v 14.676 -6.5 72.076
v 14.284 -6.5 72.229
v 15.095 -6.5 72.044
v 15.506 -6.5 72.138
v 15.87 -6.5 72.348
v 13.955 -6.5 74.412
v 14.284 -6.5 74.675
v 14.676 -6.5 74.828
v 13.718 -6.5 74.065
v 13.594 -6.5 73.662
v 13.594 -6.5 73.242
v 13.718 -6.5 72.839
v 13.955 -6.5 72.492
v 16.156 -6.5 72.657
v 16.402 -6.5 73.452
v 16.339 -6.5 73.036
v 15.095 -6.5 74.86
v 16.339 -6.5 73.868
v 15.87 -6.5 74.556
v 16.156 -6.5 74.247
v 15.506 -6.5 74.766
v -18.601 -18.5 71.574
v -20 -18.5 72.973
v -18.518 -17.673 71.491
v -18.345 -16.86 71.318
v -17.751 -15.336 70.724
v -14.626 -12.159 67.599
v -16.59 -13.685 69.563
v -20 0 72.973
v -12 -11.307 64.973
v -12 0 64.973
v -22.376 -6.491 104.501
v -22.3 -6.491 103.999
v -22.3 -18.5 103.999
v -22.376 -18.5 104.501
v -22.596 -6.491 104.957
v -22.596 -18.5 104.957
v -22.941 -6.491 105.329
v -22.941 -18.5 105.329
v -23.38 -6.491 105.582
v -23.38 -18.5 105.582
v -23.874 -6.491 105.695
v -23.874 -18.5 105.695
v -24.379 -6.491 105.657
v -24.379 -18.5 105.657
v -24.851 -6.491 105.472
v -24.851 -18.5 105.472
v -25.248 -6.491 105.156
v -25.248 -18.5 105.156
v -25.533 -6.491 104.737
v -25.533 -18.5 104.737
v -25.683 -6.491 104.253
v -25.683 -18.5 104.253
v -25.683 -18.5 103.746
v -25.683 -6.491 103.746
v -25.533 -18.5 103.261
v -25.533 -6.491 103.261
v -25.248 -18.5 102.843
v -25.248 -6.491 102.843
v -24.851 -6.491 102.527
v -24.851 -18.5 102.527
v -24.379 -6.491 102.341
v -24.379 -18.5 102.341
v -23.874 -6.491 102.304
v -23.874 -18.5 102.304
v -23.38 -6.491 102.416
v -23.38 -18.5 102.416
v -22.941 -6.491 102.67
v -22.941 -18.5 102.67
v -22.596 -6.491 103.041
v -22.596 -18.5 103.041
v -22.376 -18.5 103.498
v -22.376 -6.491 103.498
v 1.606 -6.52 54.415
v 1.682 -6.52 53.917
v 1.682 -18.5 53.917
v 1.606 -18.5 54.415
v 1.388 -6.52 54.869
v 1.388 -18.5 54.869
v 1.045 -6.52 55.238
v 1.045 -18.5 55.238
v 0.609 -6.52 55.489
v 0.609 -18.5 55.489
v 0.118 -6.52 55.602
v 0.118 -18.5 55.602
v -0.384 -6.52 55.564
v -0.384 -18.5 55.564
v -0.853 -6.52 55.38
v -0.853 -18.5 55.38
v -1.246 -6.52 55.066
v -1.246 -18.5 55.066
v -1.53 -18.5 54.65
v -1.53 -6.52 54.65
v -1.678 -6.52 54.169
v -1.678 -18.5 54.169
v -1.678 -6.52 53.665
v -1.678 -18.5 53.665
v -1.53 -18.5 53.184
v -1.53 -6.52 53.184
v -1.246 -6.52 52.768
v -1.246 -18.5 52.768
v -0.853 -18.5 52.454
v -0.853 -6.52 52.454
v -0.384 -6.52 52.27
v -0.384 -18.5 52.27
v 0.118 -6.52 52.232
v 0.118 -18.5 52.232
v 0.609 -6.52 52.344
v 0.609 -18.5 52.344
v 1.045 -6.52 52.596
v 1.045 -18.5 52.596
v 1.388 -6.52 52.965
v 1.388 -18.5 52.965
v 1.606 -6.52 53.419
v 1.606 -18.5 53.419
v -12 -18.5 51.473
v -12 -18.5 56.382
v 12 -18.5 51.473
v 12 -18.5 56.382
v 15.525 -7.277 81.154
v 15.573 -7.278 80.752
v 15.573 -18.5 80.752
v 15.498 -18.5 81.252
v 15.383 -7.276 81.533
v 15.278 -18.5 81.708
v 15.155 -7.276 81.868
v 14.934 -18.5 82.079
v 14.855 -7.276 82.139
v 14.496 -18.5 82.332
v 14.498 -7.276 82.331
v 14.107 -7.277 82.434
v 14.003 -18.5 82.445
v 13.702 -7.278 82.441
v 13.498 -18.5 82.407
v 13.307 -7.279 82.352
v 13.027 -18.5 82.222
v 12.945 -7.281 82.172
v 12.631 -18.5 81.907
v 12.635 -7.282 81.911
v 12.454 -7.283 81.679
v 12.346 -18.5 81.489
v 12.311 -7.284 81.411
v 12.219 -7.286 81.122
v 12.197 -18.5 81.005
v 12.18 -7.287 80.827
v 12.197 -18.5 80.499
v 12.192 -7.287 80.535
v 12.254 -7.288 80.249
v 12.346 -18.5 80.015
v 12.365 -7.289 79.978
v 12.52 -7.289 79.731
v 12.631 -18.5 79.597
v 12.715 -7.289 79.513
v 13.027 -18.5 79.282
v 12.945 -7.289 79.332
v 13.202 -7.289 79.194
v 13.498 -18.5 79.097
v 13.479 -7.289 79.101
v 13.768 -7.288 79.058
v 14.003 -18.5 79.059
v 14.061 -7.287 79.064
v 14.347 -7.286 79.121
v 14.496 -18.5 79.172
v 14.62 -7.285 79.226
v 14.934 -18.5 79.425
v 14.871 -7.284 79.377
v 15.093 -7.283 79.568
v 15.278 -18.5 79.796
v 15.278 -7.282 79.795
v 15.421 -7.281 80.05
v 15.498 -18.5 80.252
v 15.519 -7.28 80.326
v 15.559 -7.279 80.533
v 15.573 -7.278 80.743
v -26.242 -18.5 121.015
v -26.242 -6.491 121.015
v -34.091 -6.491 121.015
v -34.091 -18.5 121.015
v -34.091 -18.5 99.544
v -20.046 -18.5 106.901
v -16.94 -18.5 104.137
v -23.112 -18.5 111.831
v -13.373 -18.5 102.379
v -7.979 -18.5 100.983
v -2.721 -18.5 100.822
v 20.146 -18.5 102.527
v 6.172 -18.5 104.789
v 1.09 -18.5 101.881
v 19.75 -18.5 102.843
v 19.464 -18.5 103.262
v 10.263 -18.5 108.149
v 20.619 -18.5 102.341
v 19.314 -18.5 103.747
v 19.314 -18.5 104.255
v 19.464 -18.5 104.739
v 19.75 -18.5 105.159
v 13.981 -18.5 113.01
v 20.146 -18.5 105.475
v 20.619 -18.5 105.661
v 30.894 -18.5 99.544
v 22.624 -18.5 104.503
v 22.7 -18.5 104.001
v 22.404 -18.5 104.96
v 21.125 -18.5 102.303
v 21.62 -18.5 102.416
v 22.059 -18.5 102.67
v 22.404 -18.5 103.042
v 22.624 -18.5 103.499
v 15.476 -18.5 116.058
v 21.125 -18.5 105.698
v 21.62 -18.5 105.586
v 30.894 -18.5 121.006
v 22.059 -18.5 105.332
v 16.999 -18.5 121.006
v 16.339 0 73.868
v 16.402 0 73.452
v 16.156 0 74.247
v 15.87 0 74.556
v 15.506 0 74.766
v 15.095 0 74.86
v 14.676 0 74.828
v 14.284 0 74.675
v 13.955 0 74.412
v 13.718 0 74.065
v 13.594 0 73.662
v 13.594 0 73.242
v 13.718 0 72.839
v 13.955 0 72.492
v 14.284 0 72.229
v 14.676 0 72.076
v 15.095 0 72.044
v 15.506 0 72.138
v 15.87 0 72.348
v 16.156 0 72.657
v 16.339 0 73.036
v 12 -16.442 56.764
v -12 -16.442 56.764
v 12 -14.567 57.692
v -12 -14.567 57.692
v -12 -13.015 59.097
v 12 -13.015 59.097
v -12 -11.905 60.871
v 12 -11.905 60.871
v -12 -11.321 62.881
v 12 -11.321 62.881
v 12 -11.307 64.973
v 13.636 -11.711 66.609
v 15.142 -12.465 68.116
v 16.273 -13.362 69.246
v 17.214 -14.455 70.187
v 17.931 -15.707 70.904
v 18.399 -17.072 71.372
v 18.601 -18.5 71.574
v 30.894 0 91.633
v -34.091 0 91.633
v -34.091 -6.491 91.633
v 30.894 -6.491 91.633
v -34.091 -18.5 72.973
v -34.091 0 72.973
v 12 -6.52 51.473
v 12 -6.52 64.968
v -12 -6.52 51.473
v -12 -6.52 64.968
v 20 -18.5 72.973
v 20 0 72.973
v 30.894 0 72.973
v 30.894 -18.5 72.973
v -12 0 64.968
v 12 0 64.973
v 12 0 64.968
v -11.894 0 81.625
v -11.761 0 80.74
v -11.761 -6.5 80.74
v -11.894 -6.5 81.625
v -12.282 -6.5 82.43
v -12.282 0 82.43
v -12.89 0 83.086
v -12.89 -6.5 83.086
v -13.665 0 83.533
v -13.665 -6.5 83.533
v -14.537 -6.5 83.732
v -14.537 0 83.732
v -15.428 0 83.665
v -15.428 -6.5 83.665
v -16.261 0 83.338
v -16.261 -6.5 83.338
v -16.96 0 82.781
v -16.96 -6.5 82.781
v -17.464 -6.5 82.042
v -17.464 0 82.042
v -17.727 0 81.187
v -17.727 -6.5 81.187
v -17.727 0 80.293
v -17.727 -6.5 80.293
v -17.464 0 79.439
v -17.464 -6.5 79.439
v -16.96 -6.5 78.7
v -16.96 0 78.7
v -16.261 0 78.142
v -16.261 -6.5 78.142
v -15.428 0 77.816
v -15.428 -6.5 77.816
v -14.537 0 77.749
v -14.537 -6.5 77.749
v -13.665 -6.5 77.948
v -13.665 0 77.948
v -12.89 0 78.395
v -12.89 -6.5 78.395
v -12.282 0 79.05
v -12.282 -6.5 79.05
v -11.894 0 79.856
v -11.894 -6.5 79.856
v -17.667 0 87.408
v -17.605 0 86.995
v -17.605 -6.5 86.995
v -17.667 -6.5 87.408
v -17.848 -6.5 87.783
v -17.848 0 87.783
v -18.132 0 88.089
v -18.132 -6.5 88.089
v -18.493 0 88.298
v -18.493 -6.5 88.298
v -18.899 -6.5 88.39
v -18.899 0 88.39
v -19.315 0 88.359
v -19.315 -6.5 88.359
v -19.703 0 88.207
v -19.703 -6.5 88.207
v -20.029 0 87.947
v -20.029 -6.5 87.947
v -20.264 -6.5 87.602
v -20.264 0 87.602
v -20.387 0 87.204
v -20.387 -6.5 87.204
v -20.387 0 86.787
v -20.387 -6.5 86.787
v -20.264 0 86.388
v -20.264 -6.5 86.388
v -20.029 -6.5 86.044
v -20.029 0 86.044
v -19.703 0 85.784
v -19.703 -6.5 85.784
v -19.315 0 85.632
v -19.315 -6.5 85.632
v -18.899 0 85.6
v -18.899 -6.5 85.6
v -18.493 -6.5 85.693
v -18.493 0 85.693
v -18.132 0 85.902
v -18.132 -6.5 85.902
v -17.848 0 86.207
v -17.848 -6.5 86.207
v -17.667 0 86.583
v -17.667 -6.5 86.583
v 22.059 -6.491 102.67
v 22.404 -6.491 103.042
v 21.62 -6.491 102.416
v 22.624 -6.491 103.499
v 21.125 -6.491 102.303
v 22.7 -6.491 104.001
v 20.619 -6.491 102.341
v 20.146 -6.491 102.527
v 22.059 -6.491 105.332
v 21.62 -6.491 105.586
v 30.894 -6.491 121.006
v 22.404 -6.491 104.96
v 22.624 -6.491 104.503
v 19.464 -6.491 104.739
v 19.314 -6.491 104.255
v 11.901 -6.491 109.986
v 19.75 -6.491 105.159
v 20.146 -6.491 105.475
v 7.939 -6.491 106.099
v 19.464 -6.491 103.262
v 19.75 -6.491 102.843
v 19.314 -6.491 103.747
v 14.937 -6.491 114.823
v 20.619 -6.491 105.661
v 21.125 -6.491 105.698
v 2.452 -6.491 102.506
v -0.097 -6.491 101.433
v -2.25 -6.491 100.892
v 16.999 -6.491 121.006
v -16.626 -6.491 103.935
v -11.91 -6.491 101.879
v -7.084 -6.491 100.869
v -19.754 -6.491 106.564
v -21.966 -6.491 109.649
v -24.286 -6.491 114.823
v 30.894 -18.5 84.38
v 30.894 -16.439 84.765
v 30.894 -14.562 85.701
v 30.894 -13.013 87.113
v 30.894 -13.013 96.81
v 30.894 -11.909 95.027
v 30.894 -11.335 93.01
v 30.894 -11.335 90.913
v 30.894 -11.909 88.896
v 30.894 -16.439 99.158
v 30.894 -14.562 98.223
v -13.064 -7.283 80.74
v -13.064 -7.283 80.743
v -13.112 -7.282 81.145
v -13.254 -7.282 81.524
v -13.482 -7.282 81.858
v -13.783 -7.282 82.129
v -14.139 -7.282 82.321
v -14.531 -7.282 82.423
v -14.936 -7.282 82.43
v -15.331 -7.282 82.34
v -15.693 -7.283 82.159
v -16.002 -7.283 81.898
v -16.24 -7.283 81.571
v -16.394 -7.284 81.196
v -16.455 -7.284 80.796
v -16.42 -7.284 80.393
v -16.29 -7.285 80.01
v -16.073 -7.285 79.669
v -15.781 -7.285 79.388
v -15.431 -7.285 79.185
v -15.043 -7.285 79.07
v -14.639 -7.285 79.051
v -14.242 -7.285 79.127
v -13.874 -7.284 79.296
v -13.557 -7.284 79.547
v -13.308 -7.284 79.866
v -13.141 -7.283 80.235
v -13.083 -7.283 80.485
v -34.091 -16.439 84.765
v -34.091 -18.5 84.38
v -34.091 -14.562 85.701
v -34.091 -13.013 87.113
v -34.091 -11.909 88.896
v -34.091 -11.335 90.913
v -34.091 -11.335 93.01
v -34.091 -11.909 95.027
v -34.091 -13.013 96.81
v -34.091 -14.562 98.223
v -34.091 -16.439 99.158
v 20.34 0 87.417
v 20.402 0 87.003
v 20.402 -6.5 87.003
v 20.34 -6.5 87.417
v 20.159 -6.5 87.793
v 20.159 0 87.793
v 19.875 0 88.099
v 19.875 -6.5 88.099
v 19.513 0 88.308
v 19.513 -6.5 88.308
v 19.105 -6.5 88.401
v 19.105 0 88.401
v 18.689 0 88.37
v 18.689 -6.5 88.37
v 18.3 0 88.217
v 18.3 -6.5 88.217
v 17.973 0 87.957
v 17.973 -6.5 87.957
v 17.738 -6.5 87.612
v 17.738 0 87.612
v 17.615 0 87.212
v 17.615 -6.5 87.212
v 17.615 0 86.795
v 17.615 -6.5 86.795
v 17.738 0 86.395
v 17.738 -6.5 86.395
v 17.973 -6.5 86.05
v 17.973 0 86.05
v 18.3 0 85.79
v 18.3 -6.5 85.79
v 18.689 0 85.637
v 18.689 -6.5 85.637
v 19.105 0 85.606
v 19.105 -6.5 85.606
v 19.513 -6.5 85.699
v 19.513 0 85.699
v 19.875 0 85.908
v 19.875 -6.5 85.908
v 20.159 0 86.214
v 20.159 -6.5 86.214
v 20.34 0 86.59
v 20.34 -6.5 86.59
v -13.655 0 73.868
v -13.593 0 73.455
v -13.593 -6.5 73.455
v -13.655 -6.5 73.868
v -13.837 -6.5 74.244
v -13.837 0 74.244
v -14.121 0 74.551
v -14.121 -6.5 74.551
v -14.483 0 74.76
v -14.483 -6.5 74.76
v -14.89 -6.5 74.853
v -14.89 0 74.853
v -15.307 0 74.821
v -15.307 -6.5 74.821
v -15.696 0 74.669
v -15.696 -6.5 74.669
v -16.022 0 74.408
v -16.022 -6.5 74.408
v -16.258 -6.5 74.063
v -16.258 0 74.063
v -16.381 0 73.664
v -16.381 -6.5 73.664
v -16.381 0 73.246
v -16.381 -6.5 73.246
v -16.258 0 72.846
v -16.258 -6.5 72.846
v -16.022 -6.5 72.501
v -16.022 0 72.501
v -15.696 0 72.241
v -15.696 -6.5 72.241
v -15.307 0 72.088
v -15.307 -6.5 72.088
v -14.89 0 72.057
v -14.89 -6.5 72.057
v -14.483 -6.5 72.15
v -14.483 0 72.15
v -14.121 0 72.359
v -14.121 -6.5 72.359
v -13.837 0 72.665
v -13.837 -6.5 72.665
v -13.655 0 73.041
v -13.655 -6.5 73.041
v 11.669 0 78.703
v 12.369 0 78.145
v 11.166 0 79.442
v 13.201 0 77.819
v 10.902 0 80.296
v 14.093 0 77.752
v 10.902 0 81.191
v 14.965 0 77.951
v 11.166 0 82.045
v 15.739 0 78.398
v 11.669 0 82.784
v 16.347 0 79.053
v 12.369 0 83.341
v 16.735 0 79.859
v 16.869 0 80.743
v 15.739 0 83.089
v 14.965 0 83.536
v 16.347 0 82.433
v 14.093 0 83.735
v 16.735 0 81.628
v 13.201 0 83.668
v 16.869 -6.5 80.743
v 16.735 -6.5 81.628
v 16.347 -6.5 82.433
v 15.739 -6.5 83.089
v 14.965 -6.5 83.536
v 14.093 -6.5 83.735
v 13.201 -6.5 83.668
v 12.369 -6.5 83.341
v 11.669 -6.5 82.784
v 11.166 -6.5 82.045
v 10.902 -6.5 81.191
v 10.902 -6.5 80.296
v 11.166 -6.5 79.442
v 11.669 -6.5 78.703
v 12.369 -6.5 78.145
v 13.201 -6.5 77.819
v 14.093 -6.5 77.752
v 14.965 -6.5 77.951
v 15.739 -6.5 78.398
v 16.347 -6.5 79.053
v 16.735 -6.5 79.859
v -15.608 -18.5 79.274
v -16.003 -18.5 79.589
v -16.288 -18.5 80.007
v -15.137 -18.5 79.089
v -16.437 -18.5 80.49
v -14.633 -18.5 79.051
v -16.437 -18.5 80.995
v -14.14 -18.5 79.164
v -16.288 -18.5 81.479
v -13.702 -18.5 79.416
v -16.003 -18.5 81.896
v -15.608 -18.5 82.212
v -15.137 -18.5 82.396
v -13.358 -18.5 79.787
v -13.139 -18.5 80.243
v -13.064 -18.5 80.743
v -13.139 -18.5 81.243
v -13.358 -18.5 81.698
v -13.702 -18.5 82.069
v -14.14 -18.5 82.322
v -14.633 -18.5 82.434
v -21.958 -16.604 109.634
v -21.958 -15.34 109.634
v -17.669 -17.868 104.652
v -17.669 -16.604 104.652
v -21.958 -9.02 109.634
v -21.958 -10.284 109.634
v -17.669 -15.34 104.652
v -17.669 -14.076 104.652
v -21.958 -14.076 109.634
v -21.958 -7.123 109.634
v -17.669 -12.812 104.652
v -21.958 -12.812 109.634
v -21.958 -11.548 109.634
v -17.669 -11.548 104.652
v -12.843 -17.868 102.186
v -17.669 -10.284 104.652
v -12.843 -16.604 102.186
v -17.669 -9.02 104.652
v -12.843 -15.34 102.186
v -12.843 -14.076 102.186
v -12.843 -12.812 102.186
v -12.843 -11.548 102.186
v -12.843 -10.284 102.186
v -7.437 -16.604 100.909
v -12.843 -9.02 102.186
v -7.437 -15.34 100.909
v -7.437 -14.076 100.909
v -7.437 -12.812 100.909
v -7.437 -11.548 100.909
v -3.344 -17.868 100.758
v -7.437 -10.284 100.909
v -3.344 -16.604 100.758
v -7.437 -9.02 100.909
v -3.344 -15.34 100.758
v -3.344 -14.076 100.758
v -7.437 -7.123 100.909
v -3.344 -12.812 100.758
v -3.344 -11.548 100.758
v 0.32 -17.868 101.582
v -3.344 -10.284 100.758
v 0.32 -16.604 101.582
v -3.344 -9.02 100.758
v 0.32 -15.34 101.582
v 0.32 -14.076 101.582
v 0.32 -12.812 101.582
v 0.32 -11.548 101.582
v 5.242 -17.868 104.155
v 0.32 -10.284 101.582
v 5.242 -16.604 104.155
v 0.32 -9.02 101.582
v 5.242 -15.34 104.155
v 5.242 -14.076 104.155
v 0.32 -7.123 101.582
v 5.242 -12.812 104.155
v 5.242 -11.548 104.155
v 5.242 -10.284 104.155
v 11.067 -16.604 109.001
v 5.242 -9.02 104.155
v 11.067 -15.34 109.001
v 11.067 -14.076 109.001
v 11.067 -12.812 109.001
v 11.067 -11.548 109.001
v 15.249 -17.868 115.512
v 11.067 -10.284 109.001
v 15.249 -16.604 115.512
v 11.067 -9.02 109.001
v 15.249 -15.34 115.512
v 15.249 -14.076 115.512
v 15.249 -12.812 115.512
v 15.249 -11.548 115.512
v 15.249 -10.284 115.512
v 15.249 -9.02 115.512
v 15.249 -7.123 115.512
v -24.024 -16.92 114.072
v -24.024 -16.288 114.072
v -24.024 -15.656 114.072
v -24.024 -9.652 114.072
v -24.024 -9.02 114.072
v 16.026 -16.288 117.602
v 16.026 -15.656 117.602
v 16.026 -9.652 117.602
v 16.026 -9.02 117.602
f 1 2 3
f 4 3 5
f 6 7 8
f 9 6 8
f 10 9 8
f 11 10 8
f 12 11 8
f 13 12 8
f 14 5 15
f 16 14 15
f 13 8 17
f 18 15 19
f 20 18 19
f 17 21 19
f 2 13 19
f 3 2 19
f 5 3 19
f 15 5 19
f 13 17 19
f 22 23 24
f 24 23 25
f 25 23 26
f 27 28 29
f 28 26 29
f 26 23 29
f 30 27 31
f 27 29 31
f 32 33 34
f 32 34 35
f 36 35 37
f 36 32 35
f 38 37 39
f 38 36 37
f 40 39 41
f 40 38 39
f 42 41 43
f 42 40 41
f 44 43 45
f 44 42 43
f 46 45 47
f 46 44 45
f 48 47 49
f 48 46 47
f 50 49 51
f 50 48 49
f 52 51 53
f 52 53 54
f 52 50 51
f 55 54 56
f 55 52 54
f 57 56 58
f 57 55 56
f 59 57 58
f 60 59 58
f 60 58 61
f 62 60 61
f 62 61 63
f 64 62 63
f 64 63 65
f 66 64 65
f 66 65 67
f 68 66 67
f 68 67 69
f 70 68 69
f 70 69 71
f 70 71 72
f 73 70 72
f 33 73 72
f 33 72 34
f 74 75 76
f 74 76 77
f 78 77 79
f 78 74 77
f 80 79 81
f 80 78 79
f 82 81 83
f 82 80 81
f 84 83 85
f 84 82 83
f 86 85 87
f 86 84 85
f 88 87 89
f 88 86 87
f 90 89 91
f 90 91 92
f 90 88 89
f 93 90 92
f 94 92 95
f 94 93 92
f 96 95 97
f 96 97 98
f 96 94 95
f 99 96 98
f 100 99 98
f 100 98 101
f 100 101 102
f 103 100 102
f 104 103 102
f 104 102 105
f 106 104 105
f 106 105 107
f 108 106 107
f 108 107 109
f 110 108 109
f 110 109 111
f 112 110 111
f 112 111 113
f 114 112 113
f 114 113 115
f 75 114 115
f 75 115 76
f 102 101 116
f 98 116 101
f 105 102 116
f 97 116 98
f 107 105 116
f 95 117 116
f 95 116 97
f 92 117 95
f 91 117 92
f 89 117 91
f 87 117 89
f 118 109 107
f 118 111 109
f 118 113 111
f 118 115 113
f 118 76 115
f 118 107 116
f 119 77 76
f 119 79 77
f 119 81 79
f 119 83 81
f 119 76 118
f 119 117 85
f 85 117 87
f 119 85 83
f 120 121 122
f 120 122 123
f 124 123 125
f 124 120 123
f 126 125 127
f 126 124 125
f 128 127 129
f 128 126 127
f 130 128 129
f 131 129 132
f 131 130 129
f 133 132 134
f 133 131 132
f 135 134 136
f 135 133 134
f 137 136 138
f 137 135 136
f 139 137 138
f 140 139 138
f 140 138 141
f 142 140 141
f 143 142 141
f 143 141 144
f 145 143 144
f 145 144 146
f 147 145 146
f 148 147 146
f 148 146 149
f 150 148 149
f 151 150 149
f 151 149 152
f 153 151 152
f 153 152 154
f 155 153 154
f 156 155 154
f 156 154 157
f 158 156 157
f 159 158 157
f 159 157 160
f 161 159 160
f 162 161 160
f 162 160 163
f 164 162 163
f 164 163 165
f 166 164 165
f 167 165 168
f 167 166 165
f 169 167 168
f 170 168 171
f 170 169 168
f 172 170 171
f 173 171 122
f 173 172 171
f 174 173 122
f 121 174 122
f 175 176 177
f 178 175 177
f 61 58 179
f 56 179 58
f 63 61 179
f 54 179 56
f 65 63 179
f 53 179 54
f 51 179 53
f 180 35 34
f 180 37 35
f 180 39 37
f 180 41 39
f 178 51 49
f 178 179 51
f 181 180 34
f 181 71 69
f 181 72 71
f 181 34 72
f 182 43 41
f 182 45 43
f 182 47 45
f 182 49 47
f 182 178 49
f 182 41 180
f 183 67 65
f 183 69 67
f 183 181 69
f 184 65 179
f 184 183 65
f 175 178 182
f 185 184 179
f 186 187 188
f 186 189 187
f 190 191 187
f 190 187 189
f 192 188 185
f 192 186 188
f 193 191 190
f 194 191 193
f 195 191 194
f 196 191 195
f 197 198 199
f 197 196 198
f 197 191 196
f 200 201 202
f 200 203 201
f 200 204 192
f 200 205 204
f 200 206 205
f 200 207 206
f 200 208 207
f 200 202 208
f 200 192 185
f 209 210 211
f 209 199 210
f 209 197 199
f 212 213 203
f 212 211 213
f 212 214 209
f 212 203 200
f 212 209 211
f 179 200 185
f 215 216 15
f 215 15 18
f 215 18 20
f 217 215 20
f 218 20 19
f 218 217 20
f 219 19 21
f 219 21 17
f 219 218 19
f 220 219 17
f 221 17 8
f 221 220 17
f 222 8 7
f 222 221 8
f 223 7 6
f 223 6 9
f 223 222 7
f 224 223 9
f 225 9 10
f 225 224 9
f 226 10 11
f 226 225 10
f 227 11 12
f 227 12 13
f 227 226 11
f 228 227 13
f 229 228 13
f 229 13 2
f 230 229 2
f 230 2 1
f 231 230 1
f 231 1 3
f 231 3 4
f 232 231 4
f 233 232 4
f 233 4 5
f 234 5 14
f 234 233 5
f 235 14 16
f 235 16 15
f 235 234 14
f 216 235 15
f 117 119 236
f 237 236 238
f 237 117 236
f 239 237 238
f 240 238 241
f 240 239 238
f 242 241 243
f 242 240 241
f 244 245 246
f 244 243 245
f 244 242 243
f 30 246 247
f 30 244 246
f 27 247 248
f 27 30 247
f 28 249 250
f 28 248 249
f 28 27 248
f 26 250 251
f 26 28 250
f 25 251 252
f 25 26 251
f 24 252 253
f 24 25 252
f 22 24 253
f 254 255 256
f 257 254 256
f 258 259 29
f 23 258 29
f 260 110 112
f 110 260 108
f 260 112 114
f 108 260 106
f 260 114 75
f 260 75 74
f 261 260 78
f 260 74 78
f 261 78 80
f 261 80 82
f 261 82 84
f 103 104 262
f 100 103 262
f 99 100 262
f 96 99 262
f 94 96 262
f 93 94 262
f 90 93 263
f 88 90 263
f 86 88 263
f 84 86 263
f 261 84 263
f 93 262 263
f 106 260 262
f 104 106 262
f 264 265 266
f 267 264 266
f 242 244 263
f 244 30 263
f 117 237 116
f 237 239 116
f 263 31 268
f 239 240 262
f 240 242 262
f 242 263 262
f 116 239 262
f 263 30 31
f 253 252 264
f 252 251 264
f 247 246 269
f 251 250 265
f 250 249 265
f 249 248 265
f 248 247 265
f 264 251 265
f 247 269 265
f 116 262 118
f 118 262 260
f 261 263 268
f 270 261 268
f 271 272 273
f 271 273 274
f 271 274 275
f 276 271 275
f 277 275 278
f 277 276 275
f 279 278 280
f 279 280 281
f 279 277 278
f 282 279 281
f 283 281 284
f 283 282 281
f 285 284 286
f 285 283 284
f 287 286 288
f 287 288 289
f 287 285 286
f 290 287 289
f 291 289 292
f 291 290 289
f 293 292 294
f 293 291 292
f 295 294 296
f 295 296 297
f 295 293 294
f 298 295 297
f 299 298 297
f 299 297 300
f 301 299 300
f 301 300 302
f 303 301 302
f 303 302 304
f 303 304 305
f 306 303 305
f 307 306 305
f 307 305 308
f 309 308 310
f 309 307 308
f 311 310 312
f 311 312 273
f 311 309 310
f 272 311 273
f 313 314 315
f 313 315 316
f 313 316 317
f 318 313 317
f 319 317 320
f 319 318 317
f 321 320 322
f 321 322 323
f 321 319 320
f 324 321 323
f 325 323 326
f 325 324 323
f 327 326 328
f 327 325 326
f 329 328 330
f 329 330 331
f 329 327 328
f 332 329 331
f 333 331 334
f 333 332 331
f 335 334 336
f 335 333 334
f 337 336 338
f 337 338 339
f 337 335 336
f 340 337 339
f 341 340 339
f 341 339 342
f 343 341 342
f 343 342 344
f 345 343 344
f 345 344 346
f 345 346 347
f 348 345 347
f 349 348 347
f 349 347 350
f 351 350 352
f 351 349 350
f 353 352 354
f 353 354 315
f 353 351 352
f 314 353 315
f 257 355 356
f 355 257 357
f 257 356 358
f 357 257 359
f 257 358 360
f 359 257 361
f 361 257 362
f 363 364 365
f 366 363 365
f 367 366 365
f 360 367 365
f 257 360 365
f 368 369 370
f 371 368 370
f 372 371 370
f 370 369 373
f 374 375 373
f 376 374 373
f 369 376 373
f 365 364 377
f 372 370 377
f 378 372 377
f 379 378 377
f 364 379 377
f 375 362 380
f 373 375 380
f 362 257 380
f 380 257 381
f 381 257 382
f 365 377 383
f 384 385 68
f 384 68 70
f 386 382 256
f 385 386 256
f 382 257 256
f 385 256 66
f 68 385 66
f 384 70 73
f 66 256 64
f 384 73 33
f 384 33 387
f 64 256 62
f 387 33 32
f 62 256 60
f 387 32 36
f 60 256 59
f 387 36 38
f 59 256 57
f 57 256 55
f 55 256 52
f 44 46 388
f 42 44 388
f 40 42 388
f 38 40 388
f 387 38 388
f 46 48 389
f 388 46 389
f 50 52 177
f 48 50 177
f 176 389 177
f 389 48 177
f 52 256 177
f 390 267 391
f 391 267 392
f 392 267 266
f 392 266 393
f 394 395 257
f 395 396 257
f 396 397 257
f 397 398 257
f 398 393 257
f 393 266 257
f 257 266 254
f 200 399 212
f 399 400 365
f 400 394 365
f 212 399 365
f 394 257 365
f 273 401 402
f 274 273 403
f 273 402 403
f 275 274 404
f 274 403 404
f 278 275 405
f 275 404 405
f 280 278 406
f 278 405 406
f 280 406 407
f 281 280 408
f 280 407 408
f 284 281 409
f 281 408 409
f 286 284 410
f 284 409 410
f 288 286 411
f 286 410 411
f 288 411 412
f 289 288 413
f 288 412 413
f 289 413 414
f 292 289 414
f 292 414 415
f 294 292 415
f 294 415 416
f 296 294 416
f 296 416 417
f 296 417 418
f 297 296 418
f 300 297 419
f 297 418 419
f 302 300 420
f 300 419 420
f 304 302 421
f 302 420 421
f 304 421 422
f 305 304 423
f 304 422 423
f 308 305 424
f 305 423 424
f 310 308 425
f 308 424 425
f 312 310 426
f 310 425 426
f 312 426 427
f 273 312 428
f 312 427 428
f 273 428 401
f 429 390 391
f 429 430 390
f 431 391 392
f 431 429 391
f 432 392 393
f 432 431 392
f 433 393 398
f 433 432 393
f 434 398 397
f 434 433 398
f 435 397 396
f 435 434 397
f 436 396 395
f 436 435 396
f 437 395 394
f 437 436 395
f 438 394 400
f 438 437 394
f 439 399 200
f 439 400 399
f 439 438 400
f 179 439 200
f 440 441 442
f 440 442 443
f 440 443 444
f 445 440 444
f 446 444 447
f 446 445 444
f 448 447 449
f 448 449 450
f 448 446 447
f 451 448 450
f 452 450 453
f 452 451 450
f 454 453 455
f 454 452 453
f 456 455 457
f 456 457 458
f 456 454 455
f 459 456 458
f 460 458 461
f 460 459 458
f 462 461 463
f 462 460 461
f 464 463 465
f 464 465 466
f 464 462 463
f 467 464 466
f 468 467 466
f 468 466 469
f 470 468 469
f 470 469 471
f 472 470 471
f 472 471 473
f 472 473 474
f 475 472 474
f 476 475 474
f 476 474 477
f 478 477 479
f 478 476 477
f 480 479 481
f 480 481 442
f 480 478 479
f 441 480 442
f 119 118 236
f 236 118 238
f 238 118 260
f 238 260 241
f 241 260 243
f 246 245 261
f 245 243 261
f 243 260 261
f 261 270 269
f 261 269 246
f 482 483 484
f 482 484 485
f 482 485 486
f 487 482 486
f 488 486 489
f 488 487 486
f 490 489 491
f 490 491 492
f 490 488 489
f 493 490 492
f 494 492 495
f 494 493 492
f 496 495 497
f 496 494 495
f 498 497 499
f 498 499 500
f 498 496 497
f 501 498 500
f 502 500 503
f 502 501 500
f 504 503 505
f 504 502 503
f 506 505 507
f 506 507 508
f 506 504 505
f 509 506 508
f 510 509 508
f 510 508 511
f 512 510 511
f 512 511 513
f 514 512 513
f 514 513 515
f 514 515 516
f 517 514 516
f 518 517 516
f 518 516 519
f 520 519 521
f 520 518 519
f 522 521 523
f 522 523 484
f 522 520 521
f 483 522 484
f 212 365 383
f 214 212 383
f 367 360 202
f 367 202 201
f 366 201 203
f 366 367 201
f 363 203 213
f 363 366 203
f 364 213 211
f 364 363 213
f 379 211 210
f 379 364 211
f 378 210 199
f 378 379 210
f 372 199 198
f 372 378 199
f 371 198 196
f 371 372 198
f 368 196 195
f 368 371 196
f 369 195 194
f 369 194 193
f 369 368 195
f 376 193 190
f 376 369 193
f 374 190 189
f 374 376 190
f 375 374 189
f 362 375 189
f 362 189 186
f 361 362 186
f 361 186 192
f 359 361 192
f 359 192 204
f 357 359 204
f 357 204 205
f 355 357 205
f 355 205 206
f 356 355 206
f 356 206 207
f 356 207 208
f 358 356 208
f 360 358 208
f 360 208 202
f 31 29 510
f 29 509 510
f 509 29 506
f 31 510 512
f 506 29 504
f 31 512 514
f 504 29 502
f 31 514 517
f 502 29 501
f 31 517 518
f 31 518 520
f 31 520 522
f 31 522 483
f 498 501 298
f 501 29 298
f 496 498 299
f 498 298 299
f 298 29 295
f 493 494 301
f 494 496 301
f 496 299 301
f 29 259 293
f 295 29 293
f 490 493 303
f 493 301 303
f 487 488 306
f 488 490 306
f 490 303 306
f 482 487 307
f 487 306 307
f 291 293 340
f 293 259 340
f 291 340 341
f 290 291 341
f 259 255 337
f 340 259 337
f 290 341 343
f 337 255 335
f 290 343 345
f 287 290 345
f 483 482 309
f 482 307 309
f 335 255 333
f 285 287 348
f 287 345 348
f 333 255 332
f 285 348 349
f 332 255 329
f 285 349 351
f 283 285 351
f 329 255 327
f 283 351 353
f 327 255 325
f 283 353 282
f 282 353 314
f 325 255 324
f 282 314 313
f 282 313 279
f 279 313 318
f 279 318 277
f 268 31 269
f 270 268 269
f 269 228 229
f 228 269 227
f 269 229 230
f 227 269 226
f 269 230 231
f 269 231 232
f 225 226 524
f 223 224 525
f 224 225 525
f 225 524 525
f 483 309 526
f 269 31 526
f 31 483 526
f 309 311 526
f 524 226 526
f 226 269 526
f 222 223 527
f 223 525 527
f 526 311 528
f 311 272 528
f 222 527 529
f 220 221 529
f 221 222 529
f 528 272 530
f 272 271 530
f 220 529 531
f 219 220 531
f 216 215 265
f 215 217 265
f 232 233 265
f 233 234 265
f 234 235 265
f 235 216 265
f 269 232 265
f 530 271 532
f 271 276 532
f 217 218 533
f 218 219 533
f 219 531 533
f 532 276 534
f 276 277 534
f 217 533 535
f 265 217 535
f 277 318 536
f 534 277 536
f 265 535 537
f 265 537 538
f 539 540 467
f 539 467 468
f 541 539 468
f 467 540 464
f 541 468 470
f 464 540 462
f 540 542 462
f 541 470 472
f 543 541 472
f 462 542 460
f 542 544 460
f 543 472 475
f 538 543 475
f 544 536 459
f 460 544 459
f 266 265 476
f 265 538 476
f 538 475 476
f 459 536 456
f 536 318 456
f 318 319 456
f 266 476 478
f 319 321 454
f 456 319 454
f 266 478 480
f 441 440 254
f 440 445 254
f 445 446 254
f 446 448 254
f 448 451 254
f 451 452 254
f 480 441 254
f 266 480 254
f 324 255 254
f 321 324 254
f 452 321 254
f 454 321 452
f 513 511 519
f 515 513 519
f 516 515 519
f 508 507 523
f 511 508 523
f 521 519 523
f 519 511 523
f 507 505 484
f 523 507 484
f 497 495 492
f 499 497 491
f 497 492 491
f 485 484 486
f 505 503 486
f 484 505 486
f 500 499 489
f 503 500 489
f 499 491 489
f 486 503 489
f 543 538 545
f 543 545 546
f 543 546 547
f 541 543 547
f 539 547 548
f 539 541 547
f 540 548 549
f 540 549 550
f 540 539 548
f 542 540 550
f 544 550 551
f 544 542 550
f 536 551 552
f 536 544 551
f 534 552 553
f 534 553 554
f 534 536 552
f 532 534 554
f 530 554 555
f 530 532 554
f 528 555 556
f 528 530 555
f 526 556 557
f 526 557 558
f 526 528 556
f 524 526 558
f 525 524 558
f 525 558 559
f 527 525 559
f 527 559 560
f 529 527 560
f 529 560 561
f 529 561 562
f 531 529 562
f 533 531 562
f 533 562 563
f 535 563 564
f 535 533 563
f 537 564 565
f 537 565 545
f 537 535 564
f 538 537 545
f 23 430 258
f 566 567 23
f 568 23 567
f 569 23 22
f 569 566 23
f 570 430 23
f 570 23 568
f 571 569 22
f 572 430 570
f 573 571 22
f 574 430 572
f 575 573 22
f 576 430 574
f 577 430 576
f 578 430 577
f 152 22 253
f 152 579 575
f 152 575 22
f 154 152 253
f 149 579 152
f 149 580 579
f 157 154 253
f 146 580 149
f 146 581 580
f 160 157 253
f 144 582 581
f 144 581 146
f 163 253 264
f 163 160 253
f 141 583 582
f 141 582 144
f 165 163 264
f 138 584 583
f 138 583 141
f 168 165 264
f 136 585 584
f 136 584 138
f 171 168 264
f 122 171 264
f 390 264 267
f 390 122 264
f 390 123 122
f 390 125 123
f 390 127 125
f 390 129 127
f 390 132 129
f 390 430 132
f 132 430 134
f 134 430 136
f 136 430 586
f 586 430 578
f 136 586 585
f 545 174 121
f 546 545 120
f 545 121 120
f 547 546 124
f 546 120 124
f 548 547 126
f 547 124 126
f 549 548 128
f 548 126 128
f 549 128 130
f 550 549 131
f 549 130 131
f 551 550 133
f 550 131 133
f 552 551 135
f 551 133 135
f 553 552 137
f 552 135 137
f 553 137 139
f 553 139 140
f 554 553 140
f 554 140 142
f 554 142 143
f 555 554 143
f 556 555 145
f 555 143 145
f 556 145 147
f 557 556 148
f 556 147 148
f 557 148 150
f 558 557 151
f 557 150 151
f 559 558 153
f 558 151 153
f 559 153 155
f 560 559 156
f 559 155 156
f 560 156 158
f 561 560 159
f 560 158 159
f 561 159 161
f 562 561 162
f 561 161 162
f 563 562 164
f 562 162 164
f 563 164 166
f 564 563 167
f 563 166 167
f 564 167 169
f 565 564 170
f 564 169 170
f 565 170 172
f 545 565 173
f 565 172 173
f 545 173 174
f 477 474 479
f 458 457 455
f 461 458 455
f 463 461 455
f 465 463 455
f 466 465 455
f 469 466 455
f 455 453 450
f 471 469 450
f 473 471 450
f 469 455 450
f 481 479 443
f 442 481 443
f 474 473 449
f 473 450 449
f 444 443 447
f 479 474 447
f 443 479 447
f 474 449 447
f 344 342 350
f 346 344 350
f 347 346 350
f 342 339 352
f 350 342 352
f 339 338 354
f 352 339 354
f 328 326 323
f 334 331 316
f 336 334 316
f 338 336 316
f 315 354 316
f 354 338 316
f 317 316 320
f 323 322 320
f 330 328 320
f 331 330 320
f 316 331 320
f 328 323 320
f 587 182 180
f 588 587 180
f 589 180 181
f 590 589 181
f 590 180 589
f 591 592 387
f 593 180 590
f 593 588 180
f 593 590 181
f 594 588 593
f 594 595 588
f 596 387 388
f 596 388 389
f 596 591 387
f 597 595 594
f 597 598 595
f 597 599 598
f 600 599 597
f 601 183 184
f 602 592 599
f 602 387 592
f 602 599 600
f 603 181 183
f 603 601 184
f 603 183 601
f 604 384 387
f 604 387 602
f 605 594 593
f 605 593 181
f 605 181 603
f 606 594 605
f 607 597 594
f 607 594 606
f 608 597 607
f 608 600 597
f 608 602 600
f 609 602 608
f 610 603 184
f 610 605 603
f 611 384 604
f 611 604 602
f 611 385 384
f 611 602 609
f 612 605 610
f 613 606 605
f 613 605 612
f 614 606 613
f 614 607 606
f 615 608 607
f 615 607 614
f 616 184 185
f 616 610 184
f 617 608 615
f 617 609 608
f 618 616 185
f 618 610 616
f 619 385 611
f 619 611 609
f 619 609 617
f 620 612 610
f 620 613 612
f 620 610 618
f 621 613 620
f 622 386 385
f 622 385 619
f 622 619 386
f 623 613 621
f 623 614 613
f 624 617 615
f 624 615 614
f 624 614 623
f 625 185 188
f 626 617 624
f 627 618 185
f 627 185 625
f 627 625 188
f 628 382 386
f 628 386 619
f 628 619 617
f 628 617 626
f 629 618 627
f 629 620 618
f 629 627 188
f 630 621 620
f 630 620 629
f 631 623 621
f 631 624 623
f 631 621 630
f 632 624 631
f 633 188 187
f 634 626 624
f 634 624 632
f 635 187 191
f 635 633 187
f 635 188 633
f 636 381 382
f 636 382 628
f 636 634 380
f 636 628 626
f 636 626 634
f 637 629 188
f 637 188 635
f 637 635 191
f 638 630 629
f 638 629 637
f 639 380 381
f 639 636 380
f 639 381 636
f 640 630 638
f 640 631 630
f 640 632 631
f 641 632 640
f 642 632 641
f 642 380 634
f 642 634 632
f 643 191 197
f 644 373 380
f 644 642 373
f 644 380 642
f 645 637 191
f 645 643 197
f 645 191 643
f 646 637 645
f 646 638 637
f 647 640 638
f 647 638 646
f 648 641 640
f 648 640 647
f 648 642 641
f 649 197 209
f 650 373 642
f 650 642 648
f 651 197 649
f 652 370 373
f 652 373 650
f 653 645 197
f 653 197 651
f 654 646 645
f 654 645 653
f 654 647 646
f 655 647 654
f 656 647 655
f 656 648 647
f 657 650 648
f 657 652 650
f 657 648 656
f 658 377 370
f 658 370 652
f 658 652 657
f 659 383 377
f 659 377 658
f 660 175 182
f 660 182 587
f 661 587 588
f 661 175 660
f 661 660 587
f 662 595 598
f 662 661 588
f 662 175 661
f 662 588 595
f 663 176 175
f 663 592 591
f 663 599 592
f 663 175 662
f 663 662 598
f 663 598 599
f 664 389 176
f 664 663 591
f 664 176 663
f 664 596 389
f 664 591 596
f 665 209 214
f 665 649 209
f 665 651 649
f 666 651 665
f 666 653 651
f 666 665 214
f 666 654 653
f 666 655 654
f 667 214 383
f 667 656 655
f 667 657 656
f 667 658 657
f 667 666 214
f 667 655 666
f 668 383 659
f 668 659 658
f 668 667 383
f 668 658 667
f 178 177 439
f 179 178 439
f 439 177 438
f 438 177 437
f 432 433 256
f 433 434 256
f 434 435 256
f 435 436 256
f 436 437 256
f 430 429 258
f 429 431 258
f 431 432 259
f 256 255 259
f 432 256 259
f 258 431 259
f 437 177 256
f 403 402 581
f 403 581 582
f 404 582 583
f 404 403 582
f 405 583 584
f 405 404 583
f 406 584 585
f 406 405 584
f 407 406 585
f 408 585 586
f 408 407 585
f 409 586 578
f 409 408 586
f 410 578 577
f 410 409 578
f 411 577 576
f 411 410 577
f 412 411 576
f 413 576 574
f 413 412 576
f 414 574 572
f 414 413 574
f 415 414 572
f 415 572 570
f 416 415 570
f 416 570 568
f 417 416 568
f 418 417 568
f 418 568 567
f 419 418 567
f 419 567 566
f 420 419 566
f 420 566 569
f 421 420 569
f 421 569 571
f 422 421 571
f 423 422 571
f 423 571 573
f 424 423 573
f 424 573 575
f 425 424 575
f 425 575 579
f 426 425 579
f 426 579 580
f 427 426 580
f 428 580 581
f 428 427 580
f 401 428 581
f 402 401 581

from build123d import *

# Parameters (mm, degrees)
SKETCH_R        = 1.700573
SKETCH_R_2      = 1.696194
SKETCH_R_3      = 1.70239
SKETCH_R_4      = 1.697657
SKETCH_R_5      = 1.689437
PAD_DEPTH       = 18.5
SKETCH001_R     = 7.590372
SKETCH001_R_2   = 7.603755
POCKET_DEPTH    = 97
SKETCH002_R     = 3
HOLE_DEPTH      = 6.5
HOLE_TIPS_R     = 3
SKETCH003_R     = 1.411783
SKETCH003_R_2   = 1.401773
SKETCH003_R_3   = 1.398933
SKETCH003_R_4   = 1.401651
POCKET001_DEPTH = 6.5


with BuildPart() as part:
    # Sketch → Pad (new body)
    with BuildSketch(Plane.XZ):
        with BuildLine():
            Line((-26.2415, 121.015), (-34.090878, 121.015))
            Line((-34.090878, 121.015), (-34.090878, 72.973053))
            Line((-34.090878, 72.973053), (-20.00001, 72.973053))
            Line((-20.00001, 72.973053), (-12.000051, 64.973244))
            Line((-12.000051, 64.973244), (-12.000051, 51.472549))
            Line((-12.000051, 51.472549), (11.999999, 51.472549))
            Line((11.999999, 51.472549), (11.999999, 64.973244))
            Line((11.999999, 64.973244), (19.999996, 72.973244))
            Line((19.999996, 72.973244), (30.894337, 72.973244))
            Line((30.894337, 72.973244), (30.894337, 121.006))
            Line((30.894337, 121.006), (16.999, 121.006))
            add(Edge.make_bspline(
                [(-26.2415, 121.015), (-25.3823, 118.371), (-24.0265, 113.55), (-21.9777, 109.453), (-19.8085, 106.44), (-17.6392, 104.542), (-15.6507, 103.306), (-12.8788, 102.131), (-9.89209, 101.286), (-7.31753, 100.857), (-5.45812, 100.743), (-3.34125, 100.686), (-1.23869, 101.058), (0.205921, 101.515), (2.33709, 102.373), (5.1405, 104.018), (8.55125, 106.485), (11.0972, 108.888), (13.4603, 111.97), (15.3483, 115.446), (16.2081, 118.028), (16.999, 121.006)],
                knots=[0, 0, 0, 0, 0.052632, 0.105263, 0.157895, 0.210526, 0.263158, 0.315789, 0.368421, 0.421053, 0.473684, 0.526316, 0.578947, 0.631579, 0.684211, 0.736842, 0.789474, 0.842105, 0.894737, 0.947368, 1, 1, 1, 1], degree=3))
        make_face()
        with Locations((-24.000988, 103.999319)):
            Circle(SKETCH_R, mode=Mode.SUBTRACT)
        with Locations((-14.759804, 80.742604)):
            Circle(SKETCH_R_2, mode=Mode.SUBTRACT)
        with Locations((20.997655, 104.000841)):
            Circle(SKETCH_R_3, mode=Mode.SUBTRACT)
        with Locations((13.875785, 80.75203)):
            Circle(SKETCH_R_4, mode=Mode.SUBTRACT)
        with Locations((-0.007881, 53.916821)):
            Circle(SKETCH_R_5, mode=Mode.SUBTRACT)
    extrude(amount=PAD_DEPTH)

    # Sketch001 → Pocket (cut)
    with BuildSketch(Plane.YZ.offset(-37)):
        with Locations((-18.852952, 91.961696)):
            Circle(SKETCH001_R)
        with Locations((-18.845096, 63.978218)):
            Circle(SKETCH001_R_2)
        Polygon((-6.51958, 51.28841), (-6.51958, 64.967888), (0.037609, 64.967888), (0.037609, 73.101757), (0.037609, 91.632729), (-6.491428, 91.632729), (-6.491428, 124.613274), (19.66001, 122.879639), (13.066299, 46.559637), align=None)
    extrude(amount=POCKET_DEPTH, mode=Mode.SUBTRACT)

    # Sketch002 → Hole (cut)
    with BuildSketch(Plane.XZ):
        with Locations((-14.760921, 80.740323)):
            Circle(SKETCH002_R)
        with Locations((13.868655, 80.743376)):
            Circle(SKETCH002_R)
    extrude(amount=HOLE_DEPTH, mode=Mode.SUBTRACT)

    # Hole tips → Hole tip 1 section 0
    with BuildSketch(Plane.XZ.offset(6.5), mode=Mode.PRIVATE) as hole_tip_1_s0:
        with Locations((-14.760921, 80.740323)):
            Circle(HOLE_TIPS_R)
    loft([hole_tip_1_s0.sketch, Vertex(-14.760921, -8.302582, 80.740323)], mode=Mode.SUBTRACT)

    # Hole tips → Hole tip 2 section 0
    with BuildSketch(Plane.XZ.offset(6.5), mode=Mode.PRIVATE) as hole_tip_2_s0:
        with Locations((13.868655, 80.743376)):
            Circle(HOLE_TIPS_R)
    loft([hole_tip_2_s0.sketch, Vertex(13.868655, -8.302582, 80.743376)], mode=Mode.SUBTRACT)

    # Sketch003 → Pocket001 (cut)
    with BuildSketch(Plane.XZ):
        with Locations((14.989951, 73.452021)):
            Circle(SKETCH003_R)
        with Locations((-14.994772, 73.45466)):
            Circle(SKETCH003_R_2)
        with Locations((-19.003859, 86.995442)):
            Circle(SKETCH003_R_3)
        with Locations((19.000666, 87.003413)):
            Circle(SKETCH003_R_4)
    extrude(amount=POCKET001_DEPTH, mode=Mode.SUBTRACT)


solid = part.part
